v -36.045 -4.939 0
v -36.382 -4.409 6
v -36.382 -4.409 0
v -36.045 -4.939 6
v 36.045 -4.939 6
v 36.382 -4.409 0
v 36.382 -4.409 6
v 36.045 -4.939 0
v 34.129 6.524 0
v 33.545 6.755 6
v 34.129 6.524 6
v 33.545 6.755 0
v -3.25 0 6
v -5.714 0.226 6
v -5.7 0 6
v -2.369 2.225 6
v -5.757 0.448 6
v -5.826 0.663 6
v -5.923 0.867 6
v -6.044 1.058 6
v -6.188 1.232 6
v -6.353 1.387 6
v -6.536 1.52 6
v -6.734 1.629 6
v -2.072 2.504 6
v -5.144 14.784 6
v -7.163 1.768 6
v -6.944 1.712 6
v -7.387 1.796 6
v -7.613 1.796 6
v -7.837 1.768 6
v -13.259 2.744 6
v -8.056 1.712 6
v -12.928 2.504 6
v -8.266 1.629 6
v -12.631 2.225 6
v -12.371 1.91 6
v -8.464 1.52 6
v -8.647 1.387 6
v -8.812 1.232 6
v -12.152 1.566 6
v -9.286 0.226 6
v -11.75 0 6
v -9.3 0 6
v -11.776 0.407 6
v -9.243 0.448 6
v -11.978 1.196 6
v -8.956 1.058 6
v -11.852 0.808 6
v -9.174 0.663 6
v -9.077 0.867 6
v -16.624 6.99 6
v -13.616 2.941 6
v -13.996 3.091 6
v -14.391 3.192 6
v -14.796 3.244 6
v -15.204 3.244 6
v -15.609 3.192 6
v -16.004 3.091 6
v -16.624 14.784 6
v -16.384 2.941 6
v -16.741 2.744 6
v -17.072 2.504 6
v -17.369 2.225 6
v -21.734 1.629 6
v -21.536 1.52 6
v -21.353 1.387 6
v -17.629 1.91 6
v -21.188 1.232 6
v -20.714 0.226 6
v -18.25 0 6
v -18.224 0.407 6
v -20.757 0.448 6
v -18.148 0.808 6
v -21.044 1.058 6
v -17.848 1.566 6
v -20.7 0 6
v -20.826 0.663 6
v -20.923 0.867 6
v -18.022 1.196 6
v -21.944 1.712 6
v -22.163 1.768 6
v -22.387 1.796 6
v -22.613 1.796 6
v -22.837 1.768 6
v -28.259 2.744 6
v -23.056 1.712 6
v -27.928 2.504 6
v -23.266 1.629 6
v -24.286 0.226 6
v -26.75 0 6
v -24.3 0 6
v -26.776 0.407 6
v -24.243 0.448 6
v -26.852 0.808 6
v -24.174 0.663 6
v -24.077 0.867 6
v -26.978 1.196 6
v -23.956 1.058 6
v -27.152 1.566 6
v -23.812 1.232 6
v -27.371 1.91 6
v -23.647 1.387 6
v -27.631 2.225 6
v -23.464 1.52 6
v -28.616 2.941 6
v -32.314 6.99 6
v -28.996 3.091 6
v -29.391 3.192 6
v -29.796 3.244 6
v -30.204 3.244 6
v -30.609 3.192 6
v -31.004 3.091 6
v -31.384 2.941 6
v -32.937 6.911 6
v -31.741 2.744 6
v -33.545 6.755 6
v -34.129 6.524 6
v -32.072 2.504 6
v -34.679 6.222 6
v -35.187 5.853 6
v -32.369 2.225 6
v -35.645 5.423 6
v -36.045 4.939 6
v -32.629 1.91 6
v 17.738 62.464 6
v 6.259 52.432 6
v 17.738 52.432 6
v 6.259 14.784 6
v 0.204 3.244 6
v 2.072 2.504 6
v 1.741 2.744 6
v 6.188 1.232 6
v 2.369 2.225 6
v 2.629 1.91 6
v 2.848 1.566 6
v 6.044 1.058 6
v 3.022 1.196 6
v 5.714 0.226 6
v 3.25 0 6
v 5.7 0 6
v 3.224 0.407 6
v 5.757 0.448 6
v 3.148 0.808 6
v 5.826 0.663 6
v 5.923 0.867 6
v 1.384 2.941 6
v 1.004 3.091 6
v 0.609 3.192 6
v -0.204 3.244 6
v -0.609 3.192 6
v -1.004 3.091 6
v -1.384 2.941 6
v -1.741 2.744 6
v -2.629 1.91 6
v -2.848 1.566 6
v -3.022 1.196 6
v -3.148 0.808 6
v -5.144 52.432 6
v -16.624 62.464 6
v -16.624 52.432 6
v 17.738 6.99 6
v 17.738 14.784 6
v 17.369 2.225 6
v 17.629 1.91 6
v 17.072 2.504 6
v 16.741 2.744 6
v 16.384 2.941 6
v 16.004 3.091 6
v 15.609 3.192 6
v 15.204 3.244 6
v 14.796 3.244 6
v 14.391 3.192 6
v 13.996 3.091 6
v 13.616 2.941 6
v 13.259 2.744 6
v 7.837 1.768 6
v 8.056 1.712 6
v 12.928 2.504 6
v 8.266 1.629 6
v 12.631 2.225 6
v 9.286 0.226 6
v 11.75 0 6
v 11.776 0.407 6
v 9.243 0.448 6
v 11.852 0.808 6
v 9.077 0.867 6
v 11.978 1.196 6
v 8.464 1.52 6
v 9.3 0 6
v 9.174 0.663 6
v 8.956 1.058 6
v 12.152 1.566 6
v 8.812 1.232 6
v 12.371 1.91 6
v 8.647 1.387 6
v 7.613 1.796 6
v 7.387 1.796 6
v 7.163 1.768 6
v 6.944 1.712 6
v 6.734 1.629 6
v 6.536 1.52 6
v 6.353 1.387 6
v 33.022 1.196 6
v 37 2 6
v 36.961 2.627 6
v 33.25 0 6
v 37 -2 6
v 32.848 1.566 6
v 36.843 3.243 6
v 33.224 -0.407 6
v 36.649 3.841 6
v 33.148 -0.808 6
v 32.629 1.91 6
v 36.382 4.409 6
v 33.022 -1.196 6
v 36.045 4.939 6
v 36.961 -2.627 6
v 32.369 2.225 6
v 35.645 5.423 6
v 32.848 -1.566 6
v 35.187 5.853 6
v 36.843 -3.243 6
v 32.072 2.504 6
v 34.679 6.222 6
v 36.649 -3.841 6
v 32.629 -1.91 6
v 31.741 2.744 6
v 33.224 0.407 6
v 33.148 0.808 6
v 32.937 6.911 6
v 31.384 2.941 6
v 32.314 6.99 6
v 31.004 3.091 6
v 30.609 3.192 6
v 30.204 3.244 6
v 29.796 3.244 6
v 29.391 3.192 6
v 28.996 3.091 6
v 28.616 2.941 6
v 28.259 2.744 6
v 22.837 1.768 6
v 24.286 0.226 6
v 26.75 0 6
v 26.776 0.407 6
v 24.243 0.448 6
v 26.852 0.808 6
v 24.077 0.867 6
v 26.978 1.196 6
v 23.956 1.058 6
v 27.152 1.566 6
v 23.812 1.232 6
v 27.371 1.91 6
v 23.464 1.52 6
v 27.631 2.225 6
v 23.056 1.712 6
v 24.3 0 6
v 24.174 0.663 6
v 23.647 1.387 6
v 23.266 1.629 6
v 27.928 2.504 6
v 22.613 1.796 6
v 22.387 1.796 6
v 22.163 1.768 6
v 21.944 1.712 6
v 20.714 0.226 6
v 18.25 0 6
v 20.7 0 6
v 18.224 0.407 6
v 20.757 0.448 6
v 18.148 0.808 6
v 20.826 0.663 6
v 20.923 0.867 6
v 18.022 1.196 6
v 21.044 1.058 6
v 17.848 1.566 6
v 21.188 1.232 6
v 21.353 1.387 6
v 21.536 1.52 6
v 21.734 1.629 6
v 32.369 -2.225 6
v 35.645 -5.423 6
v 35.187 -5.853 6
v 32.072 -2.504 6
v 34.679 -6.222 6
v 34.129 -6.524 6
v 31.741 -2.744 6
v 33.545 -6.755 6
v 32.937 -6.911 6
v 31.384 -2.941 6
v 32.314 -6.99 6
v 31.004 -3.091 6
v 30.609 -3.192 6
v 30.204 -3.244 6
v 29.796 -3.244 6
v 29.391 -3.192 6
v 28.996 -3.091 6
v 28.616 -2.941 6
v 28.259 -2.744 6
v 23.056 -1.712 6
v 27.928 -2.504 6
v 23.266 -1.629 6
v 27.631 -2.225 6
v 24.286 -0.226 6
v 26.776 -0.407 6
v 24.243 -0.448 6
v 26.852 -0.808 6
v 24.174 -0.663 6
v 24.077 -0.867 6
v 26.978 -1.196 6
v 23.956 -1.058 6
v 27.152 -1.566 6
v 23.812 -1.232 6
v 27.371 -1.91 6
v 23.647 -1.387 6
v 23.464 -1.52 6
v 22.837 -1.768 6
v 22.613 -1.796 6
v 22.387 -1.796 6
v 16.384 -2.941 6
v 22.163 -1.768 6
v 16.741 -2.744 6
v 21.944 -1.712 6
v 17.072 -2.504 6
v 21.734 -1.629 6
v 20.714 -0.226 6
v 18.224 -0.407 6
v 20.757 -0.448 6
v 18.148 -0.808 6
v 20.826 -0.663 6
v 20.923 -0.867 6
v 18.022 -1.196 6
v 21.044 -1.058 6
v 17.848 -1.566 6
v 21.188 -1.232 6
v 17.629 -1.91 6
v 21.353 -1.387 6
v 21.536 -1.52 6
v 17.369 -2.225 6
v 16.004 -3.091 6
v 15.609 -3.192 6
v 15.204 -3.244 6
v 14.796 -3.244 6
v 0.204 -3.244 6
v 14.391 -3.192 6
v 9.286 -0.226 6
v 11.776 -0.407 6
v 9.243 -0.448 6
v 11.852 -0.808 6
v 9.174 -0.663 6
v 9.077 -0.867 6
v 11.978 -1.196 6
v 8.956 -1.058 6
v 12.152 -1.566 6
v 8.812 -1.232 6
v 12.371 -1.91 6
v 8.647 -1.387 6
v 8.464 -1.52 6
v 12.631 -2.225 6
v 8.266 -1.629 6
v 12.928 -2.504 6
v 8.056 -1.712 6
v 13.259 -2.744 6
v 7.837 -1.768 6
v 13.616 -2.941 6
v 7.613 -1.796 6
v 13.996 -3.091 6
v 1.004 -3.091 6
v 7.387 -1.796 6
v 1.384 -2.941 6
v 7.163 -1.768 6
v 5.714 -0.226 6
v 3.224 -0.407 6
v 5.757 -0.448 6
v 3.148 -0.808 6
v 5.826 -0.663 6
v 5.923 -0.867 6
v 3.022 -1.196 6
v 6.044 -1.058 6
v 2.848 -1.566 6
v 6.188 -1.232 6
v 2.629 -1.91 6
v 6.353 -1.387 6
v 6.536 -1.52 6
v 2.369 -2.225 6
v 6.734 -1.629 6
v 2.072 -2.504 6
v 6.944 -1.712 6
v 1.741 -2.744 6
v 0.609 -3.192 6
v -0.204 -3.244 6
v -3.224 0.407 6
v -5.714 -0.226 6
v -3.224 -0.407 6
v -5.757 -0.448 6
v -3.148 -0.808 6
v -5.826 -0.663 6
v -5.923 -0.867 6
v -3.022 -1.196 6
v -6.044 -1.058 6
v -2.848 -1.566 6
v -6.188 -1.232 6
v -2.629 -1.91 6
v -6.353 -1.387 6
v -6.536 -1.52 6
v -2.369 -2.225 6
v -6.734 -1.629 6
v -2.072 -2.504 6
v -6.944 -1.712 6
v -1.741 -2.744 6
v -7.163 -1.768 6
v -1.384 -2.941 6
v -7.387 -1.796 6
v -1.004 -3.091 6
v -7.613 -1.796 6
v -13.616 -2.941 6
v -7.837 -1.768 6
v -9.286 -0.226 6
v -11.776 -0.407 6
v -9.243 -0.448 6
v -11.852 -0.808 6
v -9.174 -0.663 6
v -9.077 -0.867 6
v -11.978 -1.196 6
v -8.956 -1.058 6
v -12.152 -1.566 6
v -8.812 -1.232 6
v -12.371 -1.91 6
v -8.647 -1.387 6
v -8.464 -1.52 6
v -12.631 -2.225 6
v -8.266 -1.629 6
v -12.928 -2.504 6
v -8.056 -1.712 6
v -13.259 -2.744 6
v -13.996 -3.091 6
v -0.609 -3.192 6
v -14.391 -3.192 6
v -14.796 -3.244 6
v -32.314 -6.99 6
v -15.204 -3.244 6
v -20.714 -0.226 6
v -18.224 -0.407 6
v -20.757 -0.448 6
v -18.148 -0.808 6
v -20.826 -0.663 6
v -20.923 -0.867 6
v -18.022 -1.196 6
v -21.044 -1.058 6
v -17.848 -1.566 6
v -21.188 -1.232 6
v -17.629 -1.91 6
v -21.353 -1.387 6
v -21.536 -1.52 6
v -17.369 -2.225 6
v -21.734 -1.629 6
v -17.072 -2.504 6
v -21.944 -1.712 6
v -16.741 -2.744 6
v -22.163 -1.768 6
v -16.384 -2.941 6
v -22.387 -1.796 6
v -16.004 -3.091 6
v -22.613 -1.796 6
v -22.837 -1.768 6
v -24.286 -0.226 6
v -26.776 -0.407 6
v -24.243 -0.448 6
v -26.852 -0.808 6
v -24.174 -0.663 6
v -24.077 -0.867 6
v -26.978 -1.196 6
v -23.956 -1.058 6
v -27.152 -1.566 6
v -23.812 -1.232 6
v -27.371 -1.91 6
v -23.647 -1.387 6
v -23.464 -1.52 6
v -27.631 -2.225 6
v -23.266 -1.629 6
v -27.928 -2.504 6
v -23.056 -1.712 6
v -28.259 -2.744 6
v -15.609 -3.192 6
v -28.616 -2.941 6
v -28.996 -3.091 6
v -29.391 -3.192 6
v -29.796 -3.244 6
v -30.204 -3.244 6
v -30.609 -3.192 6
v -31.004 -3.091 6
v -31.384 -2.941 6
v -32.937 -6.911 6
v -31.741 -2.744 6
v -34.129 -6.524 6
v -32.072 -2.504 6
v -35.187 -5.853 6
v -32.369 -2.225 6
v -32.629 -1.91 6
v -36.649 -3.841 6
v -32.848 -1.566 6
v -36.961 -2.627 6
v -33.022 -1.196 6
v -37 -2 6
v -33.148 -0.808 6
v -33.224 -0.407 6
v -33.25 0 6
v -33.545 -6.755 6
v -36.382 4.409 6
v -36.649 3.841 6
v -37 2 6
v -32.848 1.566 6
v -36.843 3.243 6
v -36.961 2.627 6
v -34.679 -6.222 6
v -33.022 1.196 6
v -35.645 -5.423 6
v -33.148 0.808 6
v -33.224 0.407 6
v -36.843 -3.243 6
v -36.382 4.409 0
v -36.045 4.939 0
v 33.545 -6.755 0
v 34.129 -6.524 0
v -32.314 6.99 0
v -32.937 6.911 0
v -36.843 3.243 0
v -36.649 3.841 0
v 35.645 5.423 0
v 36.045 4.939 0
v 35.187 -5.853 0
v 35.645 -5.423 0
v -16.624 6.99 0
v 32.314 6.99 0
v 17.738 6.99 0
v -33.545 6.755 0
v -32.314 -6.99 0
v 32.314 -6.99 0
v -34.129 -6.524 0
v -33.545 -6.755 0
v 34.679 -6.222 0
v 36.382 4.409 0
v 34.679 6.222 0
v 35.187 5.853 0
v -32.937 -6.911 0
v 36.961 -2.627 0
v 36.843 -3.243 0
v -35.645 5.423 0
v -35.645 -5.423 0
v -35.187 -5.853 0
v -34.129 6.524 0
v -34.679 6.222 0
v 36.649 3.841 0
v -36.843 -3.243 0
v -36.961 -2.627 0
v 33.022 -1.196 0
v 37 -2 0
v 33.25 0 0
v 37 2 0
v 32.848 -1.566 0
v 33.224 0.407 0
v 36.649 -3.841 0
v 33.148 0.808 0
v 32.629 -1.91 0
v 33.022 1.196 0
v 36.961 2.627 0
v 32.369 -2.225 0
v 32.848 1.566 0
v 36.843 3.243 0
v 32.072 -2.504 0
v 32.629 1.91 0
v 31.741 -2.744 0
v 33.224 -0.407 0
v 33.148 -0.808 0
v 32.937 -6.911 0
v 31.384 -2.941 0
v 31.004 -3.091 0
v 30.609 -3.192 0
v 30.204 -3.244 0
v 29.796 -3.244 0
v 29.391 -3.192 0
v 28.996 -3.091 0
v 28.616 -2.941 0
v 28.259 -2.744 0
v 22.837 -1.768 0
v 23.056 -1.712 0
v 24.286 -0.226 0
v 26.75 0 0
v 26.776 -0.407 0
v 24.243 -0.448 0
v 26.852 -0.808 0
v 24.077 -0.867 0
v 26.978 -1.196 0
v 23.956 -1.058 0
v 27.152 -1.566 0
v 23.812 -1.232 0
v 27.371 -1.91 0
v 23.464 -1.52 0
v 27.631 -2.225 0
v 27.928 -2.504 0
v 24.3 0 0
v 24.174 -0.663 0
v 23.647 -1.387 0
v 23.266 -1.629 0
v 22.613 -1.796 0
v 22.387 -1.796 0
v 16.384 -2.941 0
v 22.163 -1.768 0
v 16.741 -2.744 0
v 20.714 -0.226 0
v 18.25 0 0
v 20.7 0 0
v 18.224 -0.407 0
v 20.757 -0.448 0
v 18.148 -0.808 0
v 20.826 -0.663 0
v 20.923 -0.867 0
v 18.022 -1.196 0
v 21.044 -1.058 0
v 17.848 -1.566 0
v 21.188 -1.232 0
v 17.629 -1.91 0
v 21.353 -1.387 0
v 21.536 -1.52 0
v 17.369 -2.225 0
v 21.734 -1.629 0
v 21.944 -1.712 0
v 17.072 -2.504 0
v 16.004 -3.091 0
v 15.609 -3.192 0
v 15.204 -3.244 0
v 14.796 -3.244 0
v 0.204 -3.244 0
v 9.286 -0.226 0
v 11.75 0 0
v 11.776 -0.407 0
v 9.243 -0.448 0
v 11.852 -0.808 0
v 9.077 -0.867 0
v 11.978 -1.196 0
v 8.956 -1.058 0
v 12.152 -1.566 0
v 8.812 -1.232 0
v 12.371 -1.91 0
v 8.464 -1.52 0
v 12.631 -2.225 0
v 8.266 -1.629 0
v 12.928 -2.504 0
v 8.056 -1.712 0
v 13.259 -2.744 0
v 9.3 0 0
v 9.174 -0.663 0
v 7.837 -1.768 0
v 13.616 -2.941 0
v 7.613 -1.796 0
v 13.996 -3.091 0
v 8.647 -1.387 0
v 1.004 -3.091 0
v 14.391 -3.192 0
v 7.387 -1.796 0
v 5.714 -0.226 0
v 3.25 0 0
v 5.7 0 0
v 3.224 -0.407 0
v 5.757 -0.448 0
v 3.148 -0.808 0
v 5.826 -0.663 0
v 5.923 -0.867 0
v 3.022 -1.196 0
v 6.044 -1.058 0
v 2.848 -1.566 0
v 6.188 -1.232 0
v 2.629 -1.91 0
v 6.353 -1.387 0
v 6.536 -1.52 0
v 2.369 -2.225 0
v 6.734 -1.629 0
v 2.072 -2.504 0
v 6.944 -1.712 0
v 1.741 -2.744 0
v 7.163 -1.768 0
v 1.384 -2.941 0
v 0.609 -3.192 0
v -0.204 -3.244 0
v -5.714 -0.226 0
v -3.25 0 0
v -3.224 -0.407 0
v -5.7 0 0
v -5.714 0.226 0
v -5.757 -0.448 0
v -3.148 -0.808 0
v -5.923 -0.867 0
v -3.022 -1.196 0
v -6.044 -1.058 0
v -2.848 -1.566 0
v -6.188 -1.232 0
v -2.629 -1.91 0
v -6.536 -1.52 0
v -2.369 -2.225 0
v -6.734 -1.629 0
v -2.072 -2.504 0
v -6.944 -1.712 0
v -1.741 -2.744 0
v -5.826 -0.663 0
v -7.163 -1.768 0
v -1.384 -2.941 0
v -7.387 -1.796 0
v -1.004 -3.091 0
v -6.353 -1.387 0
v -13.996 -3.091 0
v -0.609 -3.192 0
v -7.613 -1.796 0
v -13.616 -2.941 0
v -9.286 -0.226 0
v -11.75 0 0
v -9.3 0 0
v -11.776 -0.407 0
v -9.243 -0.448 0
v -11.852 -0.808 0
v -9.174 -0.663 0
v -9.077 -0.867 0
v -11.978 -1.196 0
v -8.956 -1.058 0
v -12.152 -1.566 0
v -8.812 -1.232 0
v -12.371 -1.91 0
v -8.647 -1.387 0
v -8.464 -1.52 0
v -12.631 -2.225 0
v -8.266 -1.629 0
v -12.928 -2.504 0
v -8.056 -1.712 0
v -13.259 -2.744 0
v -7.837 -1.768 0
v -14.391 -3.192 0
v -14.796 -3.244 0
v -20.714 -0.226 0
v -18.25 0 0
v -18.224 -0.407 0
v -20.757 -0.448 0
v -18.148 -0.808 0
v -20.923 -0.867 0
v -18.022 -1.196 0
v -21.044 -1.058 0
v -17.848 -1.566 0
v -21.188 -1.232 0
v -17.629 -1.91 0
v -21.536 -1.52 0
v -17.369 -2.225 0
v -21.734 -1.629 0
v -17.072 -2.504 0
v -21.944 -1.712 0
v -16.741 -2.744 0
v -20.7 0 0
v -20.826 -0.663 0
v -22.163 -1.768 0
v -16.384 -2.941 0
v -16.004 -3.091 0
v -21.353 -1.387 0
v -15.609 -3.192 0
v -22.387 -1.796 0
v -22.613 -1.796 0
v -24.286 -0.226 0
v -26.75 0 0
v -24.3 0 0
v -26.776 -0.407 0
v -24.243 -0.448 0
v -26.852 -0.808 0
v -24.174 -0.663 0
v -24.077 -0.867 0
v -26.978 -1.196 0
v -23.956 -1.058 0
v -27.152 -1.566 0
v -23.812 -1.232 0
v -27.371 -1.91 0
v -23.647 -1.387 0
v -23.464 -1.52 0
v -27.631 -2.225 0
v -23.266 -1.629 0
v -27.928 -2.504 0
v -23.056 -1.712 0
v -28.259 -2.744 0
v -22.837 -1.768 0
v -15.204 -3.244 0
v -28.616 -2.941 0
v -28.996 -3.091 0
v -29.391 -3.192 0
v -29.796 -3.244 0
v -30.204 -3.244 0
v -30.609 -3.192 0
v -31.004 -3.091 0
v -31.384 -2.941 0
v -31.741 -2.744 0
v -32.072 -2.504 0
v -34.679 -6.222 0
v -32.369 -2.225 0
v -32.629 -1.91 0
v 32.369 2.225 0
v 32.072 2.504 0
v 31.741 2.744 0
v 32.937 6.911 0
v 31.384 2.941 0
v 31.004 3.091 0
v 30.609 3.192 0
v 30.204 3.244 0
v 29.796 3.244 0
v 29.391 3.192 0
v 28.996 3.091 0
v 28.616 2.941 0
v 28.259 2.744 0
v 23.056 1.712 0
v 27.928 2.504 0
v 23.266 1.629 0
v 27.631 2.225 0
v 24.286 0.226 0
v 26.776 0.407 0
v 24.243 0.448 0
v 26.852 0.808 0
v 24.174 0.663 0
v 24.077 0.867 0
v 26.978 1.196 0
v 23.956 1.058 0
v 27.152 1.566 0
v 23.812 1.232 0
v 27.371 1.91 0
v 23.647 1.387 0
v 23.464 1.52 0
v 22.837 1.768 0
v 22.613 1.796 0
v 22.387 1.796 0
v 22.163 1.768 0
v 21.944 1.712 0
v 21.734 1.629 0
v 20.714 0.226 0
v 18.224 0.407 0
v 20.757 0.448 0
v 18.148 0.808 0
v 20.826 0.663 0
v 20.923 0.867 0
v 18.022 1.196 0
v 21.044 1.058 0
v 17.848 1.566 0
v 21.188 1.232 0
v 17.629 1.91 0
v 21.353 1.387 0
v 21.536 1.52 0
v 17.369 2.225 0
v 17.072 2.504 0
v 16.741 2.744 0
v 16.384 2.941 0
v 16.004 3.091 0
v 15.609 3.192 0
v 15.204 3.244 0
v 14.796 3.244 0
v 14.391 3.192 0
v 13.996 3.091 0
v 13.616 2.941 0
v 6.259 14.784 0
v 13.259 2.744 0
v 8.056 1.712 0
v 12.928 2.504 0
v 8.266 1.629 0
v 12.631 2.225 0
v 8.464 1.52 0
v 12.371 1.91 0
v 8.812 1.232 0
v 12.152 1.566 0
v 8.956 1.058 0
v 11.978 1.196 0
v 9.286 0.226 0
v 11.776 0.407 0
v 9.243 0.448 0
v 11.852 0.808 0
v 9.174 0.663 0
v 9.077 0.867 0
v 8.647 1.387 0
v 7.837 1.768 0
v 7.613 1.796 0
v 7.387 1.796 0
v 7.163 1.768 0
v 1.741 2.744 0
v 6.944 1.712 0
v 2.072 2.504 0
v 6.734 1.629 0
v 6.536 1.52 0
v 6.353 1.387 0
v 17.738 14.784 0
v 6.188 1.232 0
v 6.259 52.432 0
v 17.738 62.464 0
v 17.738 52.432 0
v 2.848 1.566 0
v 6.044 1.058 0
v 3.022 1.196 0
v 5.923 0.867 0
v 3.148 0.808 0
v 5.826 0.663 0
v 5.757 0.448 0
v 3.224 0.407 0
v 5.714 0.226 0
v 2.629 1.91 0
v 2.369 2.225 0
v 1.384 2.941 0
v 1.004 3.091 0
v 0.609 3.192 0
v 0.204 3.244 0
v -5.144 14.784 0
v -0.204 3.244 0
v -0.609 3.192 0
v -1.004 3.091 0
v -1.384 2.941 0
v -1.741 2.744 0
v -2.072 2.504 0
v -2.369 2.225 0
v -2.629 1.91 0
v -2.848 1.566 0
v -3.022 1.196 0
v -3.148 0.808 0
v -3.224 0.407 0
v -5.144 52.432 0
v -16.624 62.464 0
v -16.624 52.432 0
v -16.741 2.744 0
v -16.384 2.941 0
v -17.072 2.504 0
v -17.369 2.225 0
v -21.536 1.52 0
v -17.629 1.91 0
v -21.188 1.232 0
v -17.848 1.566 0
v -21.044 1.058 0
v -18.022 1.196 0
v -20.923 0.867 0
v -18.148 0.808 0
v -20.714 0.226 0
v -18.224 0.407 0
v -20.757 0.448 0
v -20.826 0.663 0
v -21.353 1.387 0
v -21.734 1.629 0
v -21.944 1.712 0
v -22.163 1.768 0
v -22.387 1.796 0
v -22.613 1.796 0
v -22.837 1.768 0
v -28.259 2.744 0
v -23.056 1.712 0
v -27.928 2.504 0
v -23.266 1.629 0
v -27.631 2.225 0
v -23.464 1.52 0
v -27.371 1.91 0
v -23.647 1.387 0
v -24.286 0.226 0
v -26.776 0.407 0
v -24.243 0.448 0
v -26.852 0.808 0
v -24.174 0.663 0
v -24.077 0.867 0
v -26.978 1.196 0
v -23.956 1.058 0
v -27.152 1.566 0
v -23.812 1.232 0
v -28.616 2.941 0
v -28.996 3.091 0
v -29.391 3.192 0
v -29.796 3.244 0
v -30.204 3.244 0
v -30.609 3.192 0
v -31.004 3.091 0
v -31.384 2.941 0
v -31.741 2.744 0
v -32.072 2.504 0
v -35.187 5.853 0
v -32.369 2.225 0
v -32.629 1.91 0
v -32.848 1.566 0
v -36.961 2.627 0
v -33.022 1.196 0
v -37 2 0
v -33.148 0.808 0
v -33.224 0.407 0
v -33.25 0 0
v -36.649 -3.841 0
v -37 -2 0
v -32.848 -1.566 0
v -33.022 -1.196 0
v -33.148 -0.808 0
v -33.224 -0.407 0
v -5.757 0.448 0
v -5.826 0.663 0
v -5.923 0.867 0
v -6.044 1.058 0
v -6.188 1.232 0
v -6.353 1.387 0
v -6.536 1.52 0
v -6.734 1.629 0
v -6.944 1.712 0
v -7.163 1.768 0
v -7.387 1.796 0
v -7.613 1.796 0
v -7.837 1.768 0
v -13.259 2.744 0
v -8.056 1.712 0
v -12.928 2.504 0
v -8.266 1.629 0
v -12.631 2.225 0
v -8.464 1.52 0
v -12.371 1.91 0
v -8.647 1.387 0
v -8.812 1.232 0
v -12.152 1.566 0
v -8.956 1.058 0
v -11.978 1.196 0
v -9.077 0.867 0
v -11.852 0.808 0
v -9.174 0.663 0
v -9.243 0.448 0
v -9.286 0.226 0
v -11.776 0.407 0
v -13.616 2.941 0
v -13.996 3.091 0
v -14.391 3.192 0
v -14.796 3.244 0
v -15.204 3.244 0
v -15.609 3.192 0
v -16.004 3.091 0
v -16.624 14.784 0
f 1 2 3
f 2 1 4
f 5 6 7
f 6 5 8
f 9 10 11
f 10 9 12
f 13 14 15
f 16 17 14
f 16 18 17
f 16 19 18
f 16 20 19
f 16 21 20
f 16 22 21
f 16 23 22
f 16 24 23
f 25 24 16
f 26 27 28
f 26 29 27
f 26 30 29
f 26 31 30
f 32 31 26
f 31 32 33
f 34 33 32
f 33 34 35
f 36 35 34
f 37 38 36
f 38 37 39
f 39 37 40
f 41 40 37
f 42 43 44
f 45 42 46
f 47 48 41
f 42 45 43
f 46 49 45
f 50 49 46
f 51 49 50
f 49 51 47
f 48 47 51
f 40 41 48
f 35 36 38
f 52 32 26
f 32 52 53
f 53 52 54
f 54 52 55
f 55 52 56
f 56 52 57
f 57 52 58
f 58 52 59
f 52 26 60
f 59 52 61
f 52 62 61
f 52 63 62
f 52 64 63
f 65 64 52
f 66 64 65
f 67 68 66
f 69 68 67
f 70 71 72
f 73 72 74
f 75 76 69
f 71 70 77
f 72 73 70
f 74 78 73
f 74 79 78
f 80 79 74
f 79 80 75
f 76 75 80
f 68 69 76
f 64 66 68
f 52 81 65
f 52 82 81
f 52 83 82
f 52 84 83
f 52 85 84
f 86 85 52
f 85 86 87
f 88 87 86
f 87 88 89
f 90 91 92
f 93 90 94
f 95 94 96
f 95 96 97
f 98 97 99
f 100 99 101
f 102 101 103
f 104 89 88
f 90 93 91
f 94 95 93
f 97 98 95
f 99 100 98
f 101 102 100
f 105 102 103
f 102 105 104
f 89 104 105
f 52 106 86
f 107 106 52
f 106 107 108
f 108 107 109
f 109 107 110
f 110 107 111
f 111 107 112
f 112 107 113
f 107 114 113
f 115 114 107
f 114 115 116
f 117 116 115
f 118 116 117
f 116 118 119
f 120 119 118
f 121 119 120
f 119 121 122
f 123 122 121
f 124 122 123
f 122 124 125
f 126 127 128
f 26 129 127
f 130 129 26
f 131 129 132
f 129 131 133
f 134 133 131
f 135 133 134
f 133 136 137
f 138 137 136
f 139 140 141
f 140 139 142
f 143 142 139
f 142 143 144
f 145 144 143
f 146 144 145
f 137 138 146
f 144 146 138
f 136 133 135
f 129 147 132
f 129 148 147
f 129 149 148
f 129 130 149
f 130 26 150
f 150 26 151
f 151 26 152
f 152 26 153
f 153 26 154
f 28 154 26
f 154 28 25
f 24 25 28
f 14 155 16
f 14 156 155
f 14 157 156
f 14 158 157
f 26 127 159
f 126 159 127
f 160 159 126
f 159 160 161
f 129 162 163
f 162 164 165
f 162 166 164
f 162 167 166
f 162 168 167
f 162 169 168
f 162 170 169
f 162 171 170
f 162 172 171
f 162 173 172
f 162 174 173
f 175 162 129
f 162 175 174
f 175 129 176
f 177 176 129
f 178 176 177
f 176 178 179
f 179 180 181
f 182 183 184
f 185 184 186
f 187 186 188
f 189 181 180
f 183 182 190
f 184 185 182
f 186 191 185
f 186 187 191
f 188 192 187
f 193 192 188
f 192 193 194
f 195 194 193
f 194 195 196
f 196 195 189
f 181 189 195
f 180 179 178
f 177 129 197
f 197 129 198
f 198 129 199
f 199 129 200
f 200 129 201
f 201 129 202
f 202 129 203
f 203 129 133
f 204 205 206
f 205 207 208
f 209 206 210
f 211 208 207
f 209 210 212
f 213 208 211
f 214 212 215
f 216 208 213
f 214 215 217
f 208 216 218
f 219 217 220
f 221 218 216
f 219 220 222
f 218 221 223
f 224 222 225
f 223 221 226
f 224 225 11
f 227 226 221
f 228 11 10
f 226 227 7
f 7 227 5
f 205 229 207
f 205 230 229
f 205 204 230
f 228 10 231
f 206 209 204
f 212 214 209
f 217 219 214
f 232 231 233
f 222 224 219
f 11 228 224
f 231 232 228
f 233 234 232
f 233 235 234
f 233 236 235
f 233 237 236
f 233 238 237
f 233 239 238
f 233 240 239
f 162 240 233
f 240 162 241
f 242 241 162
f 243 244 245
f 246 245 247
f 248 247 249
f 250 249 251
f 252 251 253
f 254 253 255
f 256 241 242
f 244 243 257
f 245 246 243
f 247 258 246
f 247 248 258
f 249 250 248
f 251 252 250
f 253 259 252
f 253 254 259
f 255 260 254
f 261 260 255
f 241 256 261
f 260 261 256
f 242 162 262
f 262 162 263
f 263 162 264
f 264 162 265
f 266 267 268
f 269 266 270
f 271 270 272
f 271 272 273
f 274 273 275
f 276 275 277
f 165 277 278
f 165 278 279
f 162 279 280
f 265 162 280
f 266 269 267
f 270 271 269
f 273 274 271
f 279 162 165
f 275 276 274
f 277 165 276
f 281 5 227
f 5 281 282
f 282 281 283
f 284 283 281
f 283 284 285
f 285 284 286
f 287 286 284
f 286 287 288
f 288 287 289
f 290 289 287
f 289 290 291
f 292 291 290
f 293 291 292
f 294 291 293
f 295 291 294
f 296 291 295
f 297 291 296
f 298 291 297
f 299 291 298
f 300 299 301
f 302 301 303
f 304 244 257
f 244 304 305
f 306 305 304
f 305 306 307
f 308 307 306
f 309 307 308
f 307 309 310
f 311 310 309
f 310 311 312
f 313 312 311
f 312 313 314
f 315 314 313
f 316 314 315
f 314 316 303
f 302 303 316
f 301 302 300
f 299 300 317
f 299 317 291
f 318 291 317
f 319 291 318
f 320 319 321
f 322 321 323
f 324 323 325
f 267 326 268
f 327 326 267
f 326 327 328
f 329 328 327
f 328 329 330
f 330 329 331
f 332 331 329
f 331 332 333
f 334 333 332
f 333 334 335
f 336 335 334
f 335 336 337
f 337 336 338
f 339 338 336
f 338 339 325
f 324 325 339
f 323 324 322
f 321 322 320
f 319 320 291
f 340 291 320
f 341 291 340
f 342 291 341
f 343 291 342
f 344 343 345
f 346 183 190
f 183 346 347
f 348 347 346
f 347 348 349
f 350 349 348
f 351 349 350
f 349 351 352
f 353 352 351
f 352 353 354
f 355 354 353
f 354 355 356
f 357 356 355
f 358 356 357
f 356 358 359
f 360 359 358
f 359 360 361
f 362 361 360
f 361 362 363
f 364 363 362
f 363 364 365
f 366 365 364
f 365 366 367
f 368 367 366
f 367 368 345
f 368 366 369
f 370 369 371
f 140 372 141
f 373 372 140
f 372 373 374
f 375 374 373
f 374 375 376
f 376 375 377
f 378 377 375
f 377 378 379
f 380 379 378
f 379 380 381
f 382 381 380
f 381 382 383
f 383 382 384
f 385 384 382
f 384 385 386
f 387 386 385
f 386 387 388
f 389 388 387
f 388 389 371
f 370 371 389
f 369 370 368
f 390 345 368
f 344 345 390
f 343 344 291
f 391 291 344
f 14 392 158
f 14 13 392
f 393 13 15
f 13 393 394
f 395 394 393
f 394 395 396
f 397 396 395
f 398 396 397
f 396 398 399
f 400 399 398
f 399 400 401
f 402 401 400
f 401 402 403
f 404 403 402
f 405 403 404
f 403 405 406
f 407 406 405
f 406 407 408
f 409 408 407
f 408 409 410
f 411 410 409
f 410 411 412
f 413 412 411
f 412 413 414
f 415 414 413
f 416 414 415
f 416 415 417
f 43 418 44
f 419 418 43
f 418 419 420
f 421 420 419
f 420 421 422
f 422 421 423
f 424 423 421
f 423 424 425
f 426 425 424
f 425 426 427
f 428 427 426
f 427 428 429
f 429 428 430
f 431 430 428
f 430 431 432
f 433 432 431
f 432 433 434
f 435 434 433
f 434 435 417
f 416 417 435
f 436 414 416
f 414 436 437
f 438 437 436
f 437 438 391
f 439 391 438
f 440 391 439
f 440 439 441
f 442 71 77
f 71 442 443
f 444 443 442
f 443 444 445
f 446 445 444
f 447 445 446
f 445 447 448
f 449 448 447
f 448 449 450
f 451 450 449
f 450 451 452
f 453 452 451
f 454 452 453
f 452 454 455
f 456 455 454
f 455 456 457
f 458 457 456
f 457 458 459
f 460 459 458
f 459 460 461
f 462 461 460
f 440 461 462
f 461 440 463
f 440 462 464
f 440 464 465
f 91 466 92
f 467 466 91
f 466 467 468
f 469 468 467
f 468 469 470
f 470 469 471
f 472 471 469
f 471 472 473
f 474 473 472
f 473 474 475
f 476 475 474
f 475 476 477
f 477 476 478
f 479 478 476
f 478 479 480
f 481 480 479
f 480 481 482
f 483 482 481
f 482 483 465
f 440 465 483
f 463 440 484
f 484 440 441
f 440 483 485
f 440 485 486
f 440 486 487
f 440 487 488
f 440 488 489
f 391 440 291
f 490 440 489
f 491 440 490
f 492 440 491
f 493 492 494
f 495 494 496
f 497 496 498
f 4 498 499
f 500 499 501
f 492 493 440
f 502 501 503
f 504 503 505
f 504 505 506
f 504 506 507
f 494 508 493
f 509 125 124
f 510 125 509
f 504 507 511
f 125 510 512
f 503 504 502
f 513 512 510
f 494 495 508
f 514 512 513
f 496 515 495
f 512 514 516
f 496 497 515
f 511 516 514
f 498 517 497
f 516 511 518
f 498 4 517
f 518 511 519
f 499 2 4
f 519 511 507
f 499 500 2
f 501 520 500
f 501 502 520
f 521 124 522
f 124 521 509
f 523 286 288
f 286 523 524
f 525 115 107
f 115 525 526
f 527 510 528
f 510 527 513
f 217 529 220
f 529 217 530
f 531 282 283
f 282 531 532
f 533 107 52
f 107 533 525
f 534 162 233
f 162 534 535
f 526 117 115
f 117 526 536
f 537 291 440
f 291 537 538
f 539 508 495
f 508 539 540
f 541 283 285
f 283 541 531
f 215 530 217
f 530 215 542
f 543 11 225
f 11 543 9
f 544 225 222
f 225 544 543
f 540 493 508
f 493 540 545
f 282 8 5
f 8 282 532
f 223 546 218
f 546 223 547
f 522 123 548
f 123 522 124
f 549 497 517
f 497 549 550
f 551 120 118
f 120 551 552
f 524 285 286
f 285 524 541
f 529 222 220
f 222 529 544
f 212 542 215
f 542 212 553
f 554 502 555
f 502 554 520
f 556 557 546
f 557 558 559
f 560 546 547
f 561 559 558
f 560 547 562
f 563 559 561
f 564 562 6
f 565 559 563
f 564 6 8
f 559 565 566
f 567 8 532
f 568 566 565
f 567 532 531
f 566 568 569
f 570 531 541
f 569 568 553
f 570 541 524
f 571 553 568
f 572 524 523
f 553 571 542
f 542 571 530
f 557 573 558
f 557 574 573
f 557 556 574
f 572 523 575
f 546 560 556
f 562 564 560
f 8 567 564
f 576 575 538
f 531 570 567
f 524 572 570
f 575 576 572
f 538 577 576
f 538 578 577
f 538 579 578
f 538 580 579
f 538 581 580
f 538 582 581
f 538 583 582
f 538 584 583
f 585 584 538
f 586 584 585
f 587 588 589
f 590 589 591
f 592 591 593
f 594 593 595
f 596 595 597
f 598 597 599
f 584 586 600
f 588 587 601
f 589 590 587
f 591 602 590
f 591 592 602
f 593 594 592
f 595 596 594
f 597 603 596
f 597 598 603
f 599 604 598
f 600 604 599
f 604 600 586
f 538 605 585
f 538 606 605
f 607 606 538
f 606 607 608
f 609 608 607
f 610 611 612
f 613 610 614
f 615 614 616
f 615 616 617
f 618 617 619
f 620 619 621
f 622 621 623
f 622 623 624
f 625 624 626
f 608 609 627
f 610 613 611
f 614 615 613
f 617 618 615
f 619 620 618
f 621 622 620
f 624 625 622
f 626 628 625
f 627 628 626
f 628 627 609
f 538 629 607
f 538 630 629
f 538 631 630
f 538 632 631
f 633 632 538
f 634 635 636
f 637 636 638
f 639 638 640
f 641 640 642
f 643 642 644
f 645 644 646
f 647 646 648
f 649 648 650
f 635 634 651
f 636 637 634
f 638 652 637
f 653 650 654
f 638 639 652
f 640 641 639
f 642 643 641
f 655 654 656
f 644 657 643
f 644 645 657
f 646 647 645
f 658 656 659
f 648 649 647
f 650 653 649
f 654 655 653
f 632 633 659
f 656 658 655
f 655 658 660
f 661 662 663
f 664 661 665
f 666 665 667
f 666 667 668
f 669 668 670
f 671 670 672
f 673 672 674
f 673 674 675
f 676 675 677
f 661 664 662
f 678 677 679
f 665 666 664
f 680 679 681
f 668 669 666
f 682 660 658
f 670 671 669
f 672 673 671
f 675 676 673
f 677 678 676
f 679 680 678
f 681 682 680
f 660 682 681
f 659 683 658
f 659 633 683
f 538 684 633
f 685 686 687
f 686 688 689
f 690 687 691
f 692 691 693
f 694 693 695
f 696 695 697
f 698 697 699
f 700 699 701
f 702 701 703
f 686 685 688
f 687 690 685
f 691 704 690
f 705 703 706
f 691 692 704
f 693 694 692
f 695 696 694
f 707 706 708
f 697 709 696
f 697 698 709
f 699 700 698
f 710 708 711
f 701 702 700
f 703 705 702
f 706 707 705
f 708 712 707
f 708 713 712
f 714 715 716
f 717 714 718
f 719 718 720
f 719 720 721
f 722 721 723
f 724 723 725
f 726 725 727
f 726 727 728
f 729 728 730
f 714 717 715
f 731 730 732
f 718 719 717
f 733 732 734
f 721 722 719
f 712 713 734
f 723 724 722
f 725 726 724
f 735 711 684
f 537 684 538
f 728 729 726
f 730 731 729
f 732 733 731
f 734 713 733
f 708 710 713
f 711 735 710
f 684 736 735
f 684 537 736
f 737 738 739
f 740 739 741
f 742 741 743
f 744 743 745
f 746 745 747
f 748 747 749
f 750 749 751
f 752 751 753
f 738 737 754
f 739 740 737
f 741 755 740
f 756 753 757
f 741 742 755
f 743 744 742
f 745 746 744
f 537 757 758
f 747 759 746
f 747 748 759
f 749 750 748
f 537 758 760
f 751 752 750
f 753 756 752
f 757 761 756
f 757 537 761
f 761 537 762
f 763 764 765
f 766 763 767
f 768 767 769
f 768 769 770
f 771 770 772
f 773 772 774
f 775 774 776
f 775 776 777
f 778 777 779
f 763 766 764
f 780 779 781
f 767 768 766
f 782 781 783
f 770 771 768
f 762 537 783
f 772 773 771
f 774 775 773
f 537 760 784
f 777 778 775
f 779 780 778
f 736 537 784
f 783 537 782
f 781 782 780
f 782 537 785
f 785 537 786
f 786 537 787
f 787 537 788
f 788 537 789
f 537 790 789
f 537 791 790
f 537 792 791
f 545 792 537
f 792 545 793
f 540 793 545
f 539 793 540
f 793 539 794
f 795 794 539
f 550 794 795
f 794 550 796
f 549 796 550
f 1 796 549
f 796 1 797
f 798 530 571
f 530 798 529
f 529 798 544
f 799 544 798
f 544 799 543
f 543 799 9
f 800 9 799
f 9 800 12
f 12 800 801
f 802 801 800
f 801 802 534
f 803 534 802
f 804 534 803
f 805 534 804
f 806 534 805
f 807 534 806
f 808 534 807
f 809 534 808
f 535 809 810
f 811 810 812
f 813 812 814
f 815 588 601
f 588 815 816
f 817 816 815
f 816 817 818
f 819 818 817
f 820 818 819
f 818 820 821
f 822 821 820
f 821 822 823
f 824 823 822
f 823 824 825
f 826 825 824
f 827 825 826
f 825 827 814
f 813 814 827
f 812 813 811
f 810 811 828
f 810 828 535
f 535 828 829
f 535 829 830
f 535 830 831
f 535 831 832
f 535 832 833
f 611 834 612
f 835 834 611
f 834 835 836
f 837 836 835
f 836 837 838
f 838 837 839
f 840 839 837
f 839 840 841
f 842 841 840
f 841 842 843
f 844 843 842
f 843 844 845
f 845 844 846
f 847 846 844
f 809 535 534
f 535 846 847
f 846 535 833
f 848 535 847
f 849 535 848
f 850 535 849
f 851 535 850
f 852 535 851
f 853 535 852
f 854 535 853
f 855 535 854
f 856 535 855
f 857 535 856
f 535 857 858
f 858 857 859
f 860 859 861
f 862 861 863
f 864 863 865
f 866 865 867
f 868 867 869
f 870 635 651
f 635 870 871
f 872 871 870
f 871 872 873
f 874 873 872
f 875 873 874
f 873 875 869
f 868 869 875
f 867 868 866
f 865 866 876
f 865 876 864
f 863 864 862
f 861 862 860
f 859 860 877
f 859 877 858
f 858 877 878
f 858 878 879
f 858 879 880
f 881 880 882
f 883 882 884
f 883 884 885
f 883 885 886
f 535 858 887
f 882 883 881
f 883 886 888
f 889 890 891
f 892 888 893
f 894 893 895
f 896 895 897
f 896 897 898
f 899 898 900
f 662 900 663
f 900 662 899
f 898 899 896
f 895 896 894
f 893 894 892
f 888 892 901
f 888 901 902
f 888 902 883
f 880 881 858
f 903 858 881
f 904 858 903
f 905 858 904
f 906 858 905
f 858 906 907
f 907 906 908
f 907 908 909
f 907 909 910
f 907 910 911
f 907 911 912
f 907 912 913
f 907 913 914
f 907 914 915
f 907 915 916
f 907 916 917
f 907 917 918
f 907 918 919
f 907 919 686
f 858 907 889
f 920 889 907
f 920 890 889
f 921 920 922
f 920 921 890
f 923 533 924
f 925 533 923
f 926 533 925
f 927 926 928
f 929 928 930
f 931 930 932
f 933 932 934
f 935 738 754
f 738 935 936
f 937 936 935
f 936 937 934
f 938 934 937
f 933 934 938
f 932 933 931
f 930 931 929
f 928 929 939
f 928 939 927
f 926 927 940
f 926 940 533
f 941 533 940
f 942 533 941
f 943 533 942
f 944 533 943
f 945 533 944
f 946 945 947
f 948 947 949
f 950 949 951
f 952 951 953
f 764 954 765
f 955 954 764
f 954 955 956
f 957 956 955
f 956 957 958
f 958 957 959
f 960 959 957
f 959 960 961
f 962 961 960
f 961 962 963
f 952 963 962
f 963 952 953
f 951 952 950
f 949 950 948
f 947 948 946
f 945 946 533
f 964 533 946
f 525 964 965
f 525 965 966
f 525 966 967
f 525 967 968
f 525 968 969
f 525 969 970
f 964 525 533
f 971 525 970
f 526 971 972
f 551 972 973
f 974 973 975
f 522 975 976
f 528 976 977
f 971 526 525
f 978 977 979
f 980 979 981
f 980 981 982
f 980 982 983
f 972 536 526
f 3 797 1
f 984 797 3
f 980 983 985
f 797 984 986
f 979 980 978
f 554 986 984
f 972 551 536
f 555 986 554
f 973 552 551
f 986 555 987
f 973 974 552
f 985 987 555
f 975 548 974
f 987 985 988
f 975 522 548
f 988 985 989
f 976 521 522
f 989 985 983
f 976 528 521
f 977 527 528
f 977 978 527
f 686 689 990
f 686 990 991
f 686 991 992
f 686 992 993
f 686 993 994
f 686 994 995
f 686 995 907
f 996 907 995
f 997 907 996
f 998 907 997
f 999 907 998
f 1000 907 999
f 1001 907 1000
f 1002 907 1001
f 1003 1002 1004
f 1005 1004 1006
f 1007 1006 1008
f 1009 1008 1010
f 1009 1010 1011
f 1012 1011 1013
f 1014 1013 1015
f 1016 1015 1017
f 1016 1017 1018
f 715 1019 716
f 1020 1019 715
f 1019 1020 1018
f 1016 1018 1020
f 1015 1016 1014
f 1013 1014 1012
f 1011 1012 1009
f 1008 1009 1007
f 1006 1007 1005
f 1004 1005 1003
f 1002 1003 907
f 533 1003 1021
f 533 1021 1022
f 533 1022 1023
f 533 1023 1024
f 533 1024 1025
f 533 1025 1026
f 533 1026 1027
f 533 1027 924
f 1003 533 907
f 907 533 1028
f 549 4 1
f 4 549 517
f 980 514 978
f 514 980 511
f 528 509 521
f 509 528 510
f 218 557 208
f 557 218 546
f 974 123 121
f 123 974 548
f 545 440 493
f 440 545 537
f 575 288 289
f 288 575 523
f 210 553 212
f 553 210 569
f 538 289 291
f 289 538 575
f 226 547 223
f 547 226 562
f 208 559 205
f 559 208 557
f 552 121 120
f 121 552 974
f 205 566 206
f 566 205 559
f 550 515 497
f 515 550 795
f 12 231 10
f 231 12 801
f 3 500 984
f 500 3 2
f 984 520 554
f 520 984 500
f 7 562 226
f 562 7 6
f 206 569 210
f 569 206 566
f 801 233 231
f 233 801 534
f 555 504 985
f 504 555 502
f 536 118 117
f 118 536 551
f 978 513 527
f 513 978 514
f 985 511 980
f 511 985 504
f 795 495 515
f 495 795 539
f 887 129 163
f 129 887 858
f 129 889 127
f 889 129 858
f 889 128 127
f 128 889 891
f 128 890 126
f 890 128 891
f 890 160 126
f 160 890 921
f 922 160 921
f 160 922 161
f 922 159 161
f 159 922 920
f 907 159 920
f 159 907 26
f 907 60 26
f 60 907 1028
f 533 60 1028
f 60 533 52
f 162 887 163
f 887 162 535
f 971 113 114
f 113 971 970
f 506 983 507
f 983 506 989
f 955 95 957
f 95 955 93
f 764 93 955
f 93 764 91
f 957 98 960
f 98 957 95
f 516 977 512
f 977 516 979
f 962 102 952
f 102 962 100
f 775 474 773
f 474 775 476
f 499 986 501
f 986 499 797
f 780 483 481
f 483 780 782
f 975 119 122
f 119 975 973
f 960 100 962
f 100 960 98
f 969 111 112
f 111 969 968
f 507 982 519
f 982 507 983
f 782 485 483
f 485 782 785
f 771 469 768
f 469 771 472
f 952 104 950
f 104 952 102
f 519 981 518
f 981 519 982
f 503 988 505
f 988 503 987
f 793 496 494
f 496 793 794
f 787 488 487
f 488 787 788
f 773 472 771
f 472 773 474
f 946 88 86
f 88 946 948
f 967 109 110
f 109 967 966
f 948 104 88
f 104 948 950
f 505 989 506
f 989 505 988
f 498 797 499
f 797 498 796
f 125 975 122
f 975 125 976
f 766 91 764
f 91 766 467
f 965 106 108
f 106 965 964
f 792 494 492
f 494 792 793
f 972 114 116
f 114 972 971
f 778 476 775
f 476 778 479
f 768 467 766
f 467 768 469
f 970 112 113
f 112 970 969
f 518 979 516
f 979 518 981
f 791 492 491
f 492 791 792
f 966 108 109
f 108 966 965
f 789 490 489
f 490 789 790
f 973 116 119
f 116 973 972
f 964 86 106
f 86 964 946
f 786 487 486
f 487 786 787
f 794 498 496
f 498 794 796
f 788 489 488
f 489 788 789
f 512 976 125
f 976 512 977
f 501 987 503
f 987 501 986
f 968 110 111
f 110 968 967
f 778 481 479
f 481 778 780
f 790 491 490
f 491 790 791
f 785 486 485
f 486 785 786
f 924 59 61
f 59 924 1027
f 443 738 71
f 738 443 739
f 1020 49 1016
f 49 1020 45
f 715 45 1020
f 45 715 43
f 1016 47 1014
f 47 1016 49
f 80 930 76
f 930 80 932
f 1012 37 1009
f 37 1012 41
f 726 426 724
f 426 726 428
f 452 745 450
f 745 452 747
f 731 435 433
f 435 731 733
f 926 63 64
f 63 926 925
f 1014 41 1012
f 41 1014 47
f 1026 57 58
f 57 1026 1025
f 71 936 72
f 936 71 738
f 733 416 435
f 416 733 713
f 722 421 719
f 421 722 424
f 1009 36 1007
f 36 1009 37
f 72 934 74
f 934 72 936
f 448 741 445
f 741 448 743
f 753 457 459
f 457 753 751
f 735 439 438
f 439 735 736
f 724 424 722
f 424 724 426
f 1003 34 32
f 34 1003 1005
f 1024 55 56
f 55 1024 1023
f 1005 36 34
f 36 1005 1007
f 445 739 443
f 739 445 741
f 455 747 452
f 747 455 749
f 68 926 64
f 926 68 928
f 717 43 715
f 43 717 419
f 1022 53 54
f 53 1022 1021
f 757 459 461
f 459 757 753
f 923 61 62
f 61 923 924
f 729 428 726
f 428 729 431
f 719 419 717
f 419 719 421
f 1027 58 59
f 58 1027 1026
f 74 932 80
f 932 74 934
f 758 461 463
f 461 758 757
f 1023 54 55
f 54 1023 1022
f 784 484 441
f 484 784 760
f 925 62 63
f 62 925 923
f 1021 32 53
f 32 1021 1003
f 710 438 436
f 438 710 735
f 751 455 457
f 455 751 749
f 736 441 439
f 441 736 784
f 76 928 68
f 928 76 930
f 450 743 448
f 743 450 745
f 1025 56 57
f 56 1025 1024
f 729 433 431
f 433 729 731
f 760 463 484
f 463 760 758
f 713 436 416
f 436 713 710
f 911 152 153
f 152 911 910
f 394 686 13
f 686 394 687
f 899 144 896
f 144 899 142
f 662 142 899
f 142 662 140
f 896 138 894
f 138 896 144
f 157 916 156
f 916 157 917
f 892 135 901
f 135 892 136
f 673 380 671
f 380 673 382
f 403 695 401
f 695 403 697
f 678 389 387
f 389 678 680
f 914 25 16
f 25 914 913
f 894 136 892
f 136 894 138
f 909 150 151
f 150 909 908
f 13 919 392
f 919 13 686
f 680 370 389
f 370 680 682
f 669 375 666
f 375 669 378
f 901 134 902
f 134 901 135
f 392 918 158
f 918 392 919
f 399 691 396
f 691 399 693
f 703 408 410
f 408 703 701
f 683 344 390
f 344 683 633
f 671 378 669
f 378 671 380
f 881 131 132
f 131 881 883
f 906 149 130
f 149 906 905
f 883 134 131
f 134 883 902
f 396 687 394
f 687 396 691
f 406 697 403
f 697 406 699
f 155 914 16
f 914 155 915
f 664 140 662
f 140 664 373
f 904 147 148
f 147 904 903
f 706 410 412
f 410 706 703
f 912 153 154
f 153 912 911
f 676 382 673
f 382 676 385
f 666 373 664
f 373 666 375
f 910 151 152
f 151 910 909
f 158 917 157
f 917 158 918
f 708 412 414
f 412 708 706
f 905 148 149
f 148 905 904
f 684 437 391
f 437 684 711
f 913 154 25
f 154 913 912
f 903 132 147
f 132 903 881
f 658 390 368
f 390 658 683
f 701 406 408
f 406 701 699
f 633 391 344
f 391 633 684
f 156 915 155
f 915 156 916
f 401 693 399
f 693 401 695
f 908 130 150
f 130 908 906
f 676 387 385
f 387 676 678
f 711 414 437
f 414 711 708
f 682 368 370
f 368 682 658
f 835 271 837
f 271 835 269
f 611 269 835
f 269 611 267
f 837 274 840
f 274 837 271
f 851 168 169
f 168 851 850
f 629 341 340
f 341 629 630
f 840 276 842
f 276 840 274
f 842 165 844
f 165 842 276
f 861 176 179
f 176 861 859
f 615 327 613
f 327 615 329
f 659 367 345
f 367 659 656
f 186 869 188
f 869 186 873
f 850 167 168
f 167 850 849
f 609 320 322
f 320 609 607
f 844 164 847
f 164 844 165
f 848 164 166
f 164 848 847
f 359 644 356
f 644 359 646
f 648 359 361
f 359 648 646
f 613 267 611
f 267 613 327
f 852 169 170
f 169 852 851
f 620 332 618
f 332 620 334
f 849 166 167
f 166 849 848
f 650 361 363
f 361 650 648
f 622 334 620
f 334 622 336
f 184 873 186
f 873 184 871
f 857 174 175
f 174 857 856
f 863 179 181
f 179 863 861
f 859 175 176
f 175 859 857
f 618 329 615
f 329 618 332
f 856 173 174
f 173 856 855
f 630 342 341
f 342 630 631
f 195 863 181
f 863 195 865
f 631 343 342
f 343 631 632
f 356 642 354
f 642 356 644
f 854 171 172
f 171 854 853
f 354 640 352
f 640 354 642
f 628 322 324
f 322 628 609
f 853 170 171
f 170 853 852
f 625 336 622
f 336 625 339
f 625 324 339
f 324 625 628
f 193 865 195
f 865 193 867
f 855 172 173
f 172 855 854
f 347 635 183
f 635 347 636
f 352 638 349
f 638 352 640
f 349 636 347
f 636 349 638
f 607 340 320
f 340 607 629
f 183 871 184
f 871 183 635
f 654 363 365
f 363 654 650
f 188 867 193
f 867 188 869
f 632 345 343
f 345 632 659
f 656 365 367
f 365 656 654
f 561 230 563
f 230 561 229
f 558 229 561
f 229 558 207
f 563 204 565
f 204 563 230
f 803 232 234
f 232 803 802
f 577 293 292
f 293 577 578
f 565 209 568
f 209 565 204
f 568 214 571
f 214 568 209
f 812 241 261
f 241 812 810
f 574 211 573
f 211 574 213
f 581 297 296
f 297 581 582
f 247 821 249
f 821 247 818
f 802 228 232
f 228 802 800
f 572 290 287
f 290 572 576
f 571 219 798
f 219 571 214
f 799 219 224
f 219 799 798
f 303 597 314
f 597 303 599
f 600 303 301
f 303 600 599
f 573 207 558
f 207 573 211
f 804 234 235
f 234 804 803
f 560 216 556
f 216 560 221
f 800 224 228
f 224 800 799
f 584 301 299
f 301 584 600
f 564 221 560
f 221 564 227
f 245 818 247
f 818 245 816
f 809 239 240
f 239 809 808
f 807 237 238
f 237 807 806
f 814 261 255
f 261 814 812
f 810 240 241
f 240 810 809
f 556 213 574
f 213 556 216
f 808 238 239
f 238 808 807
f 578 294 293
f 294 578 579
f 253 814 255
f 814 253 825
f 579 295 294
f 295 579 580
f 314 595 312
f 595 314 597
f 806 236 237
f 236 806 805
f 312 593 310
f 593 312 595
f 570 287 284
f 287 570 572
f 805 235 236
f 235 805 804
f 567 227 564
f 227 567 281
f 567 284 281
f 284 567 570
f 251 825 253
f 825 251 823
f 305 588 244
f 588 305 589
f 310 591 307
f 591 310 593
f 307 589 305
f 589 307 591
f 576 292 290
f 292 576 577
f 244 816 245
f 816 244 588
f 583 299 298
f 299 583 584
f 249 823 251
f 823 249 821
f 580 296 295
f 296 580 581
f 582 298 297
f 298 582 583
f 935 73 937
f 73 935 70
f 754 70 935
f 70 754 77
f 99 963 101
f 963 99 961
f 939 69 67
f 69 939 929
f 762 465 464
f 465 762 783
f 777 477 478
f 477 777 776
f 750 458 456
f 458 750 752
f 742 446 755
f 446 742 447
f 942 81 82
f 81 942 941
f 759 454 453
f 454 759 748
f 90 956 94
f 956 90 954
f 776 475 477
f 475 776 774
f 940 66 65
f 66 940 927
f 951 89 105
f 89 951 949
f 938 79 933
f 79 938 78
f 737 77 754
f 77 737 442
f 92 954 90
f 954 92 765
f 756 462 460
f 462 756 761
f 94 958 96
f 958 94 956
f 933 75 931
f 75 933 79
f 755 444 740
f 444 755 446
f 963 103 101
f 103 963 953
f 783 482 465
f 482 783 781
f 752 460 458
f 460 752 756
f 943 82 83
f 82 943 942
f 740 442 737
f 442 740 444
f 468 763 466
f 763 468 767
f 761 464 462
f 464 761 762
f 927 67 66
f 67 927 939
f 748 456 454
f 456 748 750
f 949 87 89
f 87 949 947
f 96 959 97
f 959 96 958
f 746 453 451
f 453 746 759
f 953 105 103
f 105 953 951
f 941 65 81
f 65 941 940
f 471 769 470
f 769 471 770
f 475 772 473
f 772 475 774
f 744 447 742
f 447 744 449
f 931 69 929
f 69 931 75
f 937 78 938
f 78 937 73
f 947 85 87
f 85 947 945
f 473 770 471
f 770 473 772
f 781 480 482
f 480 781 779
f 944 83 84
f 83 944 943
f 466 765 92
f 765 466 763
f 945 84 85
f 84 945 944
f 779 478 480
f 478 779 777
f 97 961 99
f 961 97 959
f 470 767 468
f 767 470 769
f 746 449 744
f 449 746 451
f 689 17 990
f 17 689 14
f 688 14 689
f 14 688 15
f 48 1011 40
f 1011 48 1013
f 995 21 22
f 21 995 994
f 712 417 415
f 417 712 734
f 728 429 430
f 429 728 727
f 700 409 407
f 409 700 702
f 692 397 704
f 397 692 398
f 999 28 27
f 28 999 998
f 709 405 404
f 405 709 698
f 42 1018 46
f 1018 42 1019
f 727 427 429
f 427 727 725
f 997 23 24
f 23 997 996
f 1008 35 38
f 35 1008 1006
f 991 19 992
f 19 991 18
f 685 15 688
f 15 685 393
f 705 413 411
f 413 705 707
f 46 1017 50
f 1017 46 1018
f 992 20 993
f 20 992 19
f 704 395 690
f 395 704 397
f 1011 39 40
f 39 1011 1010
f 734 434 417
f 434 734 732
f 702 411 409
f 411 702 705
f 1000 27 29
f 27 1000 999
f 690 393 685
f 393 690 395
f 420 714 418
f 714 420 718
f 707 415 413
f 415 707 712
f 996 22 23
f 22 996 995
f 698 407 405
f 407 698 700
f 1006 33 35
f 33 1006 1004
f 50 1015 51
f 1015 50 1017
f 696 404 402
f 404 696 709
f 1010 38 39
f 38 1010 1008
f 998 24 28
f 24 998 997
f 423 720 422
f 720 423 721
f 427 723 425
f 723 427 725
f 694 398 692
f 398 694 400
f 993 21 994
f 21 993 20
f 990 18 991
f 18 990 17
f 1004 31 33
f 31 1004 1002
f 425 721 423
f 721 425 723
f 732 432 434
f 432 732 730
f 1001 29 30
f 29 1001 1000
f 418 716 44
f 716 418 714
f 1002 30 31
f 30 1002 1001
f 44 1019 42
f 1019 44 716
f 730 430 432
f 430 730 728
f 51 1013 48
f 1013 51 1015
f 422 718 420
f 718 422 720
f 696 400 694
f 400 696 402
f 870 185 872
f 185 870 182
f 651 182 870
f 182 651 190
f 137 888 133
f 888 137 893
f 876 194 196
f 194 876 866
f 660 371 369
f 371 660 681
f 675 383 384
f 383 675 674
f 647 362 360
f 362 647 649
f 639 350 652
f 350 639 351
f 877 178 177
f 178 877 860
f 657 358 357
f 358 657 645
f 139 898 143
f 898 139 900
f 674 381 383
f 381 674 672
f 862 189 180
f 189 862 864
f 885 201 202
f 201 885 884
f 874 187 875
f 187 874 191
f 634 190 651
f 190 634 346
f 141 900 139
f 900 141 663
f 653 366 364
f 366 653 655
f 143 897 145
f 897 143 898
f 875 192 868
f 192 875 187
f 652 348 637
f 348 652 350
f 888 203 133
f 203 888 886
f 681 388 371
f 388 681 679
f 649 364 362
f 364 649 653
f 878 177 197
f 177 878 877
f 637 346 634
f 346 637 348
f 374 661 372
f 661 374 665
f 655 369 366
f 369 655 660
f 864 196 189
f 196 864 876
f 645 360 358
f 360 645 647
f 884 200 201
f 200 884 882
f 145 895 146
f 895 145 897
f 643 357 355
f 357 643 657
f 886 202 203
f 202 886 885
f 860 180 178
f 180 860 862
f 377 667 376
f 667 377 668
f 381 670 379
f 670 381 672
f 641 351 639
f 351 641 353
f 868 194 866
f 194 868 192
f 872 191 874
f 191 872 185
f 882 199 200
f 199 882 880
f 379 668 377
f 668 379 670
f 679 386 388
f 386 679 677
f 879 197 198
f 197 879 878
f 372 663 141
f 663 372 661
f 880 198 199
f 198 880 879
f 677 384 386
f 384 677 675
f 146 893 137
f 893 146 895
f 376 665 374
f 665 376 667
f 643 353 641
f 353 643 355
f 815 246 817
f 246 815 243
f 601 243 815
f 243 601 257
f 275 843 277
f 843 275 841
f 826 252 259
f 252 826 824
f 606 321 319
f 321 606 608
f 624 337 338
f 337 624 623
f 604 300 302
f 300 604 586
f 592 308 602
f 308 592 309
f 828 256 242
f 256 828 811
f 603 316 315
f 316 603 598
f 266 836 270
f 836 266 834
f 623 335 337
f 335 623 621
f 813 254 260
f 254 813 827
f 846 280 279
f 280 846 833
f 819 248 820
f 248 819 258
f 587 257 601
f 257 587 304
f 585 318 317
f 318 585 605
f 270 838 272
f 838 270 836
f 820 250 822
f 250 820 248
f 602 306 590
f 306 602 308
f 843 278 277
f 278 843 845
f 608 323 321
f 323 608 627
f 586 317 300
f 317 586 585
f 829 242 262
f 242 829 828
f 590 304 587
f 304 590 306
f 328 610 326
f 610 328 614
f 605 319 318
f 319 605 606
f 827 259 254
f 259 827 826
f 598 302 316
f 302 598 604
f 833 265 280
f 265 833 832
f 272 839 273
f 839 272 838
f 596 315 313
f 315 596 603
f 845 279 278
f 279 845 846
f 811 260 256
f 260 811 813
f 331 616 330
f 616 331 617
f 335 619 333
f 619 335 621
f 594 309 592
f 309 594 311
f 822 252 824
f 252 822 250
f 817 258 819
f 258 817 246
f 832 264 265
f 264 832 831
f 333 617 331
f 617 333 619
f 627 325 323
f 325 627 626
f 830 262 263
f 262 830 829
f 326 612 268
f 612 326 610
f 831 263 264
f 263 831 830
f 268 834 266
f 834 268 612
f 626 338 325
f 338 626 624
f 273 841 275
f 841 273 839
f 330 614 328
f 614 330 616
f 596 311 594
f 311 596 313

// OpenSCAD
$fn = 50;


difference() {
	union() {
		hull() {
			translate(v = [-32.0000000000, 2.0000000000, 0]) {
				cylinder(h = 6, r = 5);
			}
			translate(v = [32.0000000000, 2.0000000000, 0]) {
				cylinder(h = 6, r = 5);
			}
			translate(v = [-32.0000000000, -2.0000000000, 0]) {
				cylinder(h = 6, r = 5);
			}
			translate(v = [32.0000000000, -2.0000000000, 0]) {
				cylinder(h = 6, r = 5);
			}
		}
		translate(v = [0, 61.1111111111, 0]) {
			linear_extrude(height = 6) {
				text(font = "DejaVu Sans Mono:style=Bold", halign = "center", size = 57.0000000000, text = "I", valign = "top");
			}
		}
	}
	union() {
		translate(v = [-30.0000000000, 0.0000000000, 0]) {
			translate(v = [0, 0, -100]) {
				cylinder(h = 200, r = 3.2500000000);
			}
		}
		translate(v = [-15.0000000000, 0.0000000000, 0]) {
			translate(v = [0, 0, -100]) {
				cylinder(h = 200, r = 3.2500000000);
			}
		}
		translate(v = [0, 0, -100]) {
			cylinder(h = 200, r = 3.2500000000);
		}
		translate(v = [15.0000000000, 0.0000000000, 0]) {
			translate(v = [0, 0, -100]) {
				cylinder(h = 200, r = 3.2500000000);
			}
		}
		translate(v = [30.0000000000, 0.0000000000, 0]) {
			translate(v = [0, 0, -100]) {
				cylinder(h = 200, r = 3.2500000000);
			}
		}
		translate(v = [-30.0000000000, 0.0000000000, 0]) {
			translate(v = [0, 0, -100]) {
				cylinder(h = 200, r = 1.8000000000);
			}
		}
		translate(v = [-22.5000000000, 0.0000000000, 0]) {
			translate(v = [0, 0, -100]) {
				cylinder(h = 200, r = 1.8000000000);
			}
		}
		translate(v = [-15.0000000000, 0.0000000000, 0]) {
			translate(v = [0, 0, -100]) {
				cylinder(h = 200, r = 1.8000000000);
			}
		}
		translate(v = [-7.5000000000, 0.0000000000, 0]) {
			translate(v = [0, 0, -100]) {
				cylinder(h = 200, r = 1.8000000000);
			}
		}
		translate(v = [0, 0, -100]) {
			cylinder(h = 200, r = 1.8000000000);
		}
		translate(v = [7.5000000000, 0.0000000000, 0]) {
			translate(v = [0, 0, -100]) {
				cylinder(h = 200, r = 1.8000000000);
			}
		}
		translate(v = [15.0000000000, 0.0000000000, 0]) {
			translate(v = [0, 0, -100]) {
				cylinder(h = 200, r = 1.8000000000);
			}
		}
		translate(v = [22.5000000000, 0.0000000000, 0]) {
			translate(v = [0, 0, -100]) {
				cylinder(h = 200, r = 1.8000000000);
			}
		}
		translate(v = [30.0000000000, 0.0000000000, 0]) {
			translate(v = [0, 0, -100]) {
				cylinder(h = 200, r = 1.8000000000);
			}
		}
	}
}
